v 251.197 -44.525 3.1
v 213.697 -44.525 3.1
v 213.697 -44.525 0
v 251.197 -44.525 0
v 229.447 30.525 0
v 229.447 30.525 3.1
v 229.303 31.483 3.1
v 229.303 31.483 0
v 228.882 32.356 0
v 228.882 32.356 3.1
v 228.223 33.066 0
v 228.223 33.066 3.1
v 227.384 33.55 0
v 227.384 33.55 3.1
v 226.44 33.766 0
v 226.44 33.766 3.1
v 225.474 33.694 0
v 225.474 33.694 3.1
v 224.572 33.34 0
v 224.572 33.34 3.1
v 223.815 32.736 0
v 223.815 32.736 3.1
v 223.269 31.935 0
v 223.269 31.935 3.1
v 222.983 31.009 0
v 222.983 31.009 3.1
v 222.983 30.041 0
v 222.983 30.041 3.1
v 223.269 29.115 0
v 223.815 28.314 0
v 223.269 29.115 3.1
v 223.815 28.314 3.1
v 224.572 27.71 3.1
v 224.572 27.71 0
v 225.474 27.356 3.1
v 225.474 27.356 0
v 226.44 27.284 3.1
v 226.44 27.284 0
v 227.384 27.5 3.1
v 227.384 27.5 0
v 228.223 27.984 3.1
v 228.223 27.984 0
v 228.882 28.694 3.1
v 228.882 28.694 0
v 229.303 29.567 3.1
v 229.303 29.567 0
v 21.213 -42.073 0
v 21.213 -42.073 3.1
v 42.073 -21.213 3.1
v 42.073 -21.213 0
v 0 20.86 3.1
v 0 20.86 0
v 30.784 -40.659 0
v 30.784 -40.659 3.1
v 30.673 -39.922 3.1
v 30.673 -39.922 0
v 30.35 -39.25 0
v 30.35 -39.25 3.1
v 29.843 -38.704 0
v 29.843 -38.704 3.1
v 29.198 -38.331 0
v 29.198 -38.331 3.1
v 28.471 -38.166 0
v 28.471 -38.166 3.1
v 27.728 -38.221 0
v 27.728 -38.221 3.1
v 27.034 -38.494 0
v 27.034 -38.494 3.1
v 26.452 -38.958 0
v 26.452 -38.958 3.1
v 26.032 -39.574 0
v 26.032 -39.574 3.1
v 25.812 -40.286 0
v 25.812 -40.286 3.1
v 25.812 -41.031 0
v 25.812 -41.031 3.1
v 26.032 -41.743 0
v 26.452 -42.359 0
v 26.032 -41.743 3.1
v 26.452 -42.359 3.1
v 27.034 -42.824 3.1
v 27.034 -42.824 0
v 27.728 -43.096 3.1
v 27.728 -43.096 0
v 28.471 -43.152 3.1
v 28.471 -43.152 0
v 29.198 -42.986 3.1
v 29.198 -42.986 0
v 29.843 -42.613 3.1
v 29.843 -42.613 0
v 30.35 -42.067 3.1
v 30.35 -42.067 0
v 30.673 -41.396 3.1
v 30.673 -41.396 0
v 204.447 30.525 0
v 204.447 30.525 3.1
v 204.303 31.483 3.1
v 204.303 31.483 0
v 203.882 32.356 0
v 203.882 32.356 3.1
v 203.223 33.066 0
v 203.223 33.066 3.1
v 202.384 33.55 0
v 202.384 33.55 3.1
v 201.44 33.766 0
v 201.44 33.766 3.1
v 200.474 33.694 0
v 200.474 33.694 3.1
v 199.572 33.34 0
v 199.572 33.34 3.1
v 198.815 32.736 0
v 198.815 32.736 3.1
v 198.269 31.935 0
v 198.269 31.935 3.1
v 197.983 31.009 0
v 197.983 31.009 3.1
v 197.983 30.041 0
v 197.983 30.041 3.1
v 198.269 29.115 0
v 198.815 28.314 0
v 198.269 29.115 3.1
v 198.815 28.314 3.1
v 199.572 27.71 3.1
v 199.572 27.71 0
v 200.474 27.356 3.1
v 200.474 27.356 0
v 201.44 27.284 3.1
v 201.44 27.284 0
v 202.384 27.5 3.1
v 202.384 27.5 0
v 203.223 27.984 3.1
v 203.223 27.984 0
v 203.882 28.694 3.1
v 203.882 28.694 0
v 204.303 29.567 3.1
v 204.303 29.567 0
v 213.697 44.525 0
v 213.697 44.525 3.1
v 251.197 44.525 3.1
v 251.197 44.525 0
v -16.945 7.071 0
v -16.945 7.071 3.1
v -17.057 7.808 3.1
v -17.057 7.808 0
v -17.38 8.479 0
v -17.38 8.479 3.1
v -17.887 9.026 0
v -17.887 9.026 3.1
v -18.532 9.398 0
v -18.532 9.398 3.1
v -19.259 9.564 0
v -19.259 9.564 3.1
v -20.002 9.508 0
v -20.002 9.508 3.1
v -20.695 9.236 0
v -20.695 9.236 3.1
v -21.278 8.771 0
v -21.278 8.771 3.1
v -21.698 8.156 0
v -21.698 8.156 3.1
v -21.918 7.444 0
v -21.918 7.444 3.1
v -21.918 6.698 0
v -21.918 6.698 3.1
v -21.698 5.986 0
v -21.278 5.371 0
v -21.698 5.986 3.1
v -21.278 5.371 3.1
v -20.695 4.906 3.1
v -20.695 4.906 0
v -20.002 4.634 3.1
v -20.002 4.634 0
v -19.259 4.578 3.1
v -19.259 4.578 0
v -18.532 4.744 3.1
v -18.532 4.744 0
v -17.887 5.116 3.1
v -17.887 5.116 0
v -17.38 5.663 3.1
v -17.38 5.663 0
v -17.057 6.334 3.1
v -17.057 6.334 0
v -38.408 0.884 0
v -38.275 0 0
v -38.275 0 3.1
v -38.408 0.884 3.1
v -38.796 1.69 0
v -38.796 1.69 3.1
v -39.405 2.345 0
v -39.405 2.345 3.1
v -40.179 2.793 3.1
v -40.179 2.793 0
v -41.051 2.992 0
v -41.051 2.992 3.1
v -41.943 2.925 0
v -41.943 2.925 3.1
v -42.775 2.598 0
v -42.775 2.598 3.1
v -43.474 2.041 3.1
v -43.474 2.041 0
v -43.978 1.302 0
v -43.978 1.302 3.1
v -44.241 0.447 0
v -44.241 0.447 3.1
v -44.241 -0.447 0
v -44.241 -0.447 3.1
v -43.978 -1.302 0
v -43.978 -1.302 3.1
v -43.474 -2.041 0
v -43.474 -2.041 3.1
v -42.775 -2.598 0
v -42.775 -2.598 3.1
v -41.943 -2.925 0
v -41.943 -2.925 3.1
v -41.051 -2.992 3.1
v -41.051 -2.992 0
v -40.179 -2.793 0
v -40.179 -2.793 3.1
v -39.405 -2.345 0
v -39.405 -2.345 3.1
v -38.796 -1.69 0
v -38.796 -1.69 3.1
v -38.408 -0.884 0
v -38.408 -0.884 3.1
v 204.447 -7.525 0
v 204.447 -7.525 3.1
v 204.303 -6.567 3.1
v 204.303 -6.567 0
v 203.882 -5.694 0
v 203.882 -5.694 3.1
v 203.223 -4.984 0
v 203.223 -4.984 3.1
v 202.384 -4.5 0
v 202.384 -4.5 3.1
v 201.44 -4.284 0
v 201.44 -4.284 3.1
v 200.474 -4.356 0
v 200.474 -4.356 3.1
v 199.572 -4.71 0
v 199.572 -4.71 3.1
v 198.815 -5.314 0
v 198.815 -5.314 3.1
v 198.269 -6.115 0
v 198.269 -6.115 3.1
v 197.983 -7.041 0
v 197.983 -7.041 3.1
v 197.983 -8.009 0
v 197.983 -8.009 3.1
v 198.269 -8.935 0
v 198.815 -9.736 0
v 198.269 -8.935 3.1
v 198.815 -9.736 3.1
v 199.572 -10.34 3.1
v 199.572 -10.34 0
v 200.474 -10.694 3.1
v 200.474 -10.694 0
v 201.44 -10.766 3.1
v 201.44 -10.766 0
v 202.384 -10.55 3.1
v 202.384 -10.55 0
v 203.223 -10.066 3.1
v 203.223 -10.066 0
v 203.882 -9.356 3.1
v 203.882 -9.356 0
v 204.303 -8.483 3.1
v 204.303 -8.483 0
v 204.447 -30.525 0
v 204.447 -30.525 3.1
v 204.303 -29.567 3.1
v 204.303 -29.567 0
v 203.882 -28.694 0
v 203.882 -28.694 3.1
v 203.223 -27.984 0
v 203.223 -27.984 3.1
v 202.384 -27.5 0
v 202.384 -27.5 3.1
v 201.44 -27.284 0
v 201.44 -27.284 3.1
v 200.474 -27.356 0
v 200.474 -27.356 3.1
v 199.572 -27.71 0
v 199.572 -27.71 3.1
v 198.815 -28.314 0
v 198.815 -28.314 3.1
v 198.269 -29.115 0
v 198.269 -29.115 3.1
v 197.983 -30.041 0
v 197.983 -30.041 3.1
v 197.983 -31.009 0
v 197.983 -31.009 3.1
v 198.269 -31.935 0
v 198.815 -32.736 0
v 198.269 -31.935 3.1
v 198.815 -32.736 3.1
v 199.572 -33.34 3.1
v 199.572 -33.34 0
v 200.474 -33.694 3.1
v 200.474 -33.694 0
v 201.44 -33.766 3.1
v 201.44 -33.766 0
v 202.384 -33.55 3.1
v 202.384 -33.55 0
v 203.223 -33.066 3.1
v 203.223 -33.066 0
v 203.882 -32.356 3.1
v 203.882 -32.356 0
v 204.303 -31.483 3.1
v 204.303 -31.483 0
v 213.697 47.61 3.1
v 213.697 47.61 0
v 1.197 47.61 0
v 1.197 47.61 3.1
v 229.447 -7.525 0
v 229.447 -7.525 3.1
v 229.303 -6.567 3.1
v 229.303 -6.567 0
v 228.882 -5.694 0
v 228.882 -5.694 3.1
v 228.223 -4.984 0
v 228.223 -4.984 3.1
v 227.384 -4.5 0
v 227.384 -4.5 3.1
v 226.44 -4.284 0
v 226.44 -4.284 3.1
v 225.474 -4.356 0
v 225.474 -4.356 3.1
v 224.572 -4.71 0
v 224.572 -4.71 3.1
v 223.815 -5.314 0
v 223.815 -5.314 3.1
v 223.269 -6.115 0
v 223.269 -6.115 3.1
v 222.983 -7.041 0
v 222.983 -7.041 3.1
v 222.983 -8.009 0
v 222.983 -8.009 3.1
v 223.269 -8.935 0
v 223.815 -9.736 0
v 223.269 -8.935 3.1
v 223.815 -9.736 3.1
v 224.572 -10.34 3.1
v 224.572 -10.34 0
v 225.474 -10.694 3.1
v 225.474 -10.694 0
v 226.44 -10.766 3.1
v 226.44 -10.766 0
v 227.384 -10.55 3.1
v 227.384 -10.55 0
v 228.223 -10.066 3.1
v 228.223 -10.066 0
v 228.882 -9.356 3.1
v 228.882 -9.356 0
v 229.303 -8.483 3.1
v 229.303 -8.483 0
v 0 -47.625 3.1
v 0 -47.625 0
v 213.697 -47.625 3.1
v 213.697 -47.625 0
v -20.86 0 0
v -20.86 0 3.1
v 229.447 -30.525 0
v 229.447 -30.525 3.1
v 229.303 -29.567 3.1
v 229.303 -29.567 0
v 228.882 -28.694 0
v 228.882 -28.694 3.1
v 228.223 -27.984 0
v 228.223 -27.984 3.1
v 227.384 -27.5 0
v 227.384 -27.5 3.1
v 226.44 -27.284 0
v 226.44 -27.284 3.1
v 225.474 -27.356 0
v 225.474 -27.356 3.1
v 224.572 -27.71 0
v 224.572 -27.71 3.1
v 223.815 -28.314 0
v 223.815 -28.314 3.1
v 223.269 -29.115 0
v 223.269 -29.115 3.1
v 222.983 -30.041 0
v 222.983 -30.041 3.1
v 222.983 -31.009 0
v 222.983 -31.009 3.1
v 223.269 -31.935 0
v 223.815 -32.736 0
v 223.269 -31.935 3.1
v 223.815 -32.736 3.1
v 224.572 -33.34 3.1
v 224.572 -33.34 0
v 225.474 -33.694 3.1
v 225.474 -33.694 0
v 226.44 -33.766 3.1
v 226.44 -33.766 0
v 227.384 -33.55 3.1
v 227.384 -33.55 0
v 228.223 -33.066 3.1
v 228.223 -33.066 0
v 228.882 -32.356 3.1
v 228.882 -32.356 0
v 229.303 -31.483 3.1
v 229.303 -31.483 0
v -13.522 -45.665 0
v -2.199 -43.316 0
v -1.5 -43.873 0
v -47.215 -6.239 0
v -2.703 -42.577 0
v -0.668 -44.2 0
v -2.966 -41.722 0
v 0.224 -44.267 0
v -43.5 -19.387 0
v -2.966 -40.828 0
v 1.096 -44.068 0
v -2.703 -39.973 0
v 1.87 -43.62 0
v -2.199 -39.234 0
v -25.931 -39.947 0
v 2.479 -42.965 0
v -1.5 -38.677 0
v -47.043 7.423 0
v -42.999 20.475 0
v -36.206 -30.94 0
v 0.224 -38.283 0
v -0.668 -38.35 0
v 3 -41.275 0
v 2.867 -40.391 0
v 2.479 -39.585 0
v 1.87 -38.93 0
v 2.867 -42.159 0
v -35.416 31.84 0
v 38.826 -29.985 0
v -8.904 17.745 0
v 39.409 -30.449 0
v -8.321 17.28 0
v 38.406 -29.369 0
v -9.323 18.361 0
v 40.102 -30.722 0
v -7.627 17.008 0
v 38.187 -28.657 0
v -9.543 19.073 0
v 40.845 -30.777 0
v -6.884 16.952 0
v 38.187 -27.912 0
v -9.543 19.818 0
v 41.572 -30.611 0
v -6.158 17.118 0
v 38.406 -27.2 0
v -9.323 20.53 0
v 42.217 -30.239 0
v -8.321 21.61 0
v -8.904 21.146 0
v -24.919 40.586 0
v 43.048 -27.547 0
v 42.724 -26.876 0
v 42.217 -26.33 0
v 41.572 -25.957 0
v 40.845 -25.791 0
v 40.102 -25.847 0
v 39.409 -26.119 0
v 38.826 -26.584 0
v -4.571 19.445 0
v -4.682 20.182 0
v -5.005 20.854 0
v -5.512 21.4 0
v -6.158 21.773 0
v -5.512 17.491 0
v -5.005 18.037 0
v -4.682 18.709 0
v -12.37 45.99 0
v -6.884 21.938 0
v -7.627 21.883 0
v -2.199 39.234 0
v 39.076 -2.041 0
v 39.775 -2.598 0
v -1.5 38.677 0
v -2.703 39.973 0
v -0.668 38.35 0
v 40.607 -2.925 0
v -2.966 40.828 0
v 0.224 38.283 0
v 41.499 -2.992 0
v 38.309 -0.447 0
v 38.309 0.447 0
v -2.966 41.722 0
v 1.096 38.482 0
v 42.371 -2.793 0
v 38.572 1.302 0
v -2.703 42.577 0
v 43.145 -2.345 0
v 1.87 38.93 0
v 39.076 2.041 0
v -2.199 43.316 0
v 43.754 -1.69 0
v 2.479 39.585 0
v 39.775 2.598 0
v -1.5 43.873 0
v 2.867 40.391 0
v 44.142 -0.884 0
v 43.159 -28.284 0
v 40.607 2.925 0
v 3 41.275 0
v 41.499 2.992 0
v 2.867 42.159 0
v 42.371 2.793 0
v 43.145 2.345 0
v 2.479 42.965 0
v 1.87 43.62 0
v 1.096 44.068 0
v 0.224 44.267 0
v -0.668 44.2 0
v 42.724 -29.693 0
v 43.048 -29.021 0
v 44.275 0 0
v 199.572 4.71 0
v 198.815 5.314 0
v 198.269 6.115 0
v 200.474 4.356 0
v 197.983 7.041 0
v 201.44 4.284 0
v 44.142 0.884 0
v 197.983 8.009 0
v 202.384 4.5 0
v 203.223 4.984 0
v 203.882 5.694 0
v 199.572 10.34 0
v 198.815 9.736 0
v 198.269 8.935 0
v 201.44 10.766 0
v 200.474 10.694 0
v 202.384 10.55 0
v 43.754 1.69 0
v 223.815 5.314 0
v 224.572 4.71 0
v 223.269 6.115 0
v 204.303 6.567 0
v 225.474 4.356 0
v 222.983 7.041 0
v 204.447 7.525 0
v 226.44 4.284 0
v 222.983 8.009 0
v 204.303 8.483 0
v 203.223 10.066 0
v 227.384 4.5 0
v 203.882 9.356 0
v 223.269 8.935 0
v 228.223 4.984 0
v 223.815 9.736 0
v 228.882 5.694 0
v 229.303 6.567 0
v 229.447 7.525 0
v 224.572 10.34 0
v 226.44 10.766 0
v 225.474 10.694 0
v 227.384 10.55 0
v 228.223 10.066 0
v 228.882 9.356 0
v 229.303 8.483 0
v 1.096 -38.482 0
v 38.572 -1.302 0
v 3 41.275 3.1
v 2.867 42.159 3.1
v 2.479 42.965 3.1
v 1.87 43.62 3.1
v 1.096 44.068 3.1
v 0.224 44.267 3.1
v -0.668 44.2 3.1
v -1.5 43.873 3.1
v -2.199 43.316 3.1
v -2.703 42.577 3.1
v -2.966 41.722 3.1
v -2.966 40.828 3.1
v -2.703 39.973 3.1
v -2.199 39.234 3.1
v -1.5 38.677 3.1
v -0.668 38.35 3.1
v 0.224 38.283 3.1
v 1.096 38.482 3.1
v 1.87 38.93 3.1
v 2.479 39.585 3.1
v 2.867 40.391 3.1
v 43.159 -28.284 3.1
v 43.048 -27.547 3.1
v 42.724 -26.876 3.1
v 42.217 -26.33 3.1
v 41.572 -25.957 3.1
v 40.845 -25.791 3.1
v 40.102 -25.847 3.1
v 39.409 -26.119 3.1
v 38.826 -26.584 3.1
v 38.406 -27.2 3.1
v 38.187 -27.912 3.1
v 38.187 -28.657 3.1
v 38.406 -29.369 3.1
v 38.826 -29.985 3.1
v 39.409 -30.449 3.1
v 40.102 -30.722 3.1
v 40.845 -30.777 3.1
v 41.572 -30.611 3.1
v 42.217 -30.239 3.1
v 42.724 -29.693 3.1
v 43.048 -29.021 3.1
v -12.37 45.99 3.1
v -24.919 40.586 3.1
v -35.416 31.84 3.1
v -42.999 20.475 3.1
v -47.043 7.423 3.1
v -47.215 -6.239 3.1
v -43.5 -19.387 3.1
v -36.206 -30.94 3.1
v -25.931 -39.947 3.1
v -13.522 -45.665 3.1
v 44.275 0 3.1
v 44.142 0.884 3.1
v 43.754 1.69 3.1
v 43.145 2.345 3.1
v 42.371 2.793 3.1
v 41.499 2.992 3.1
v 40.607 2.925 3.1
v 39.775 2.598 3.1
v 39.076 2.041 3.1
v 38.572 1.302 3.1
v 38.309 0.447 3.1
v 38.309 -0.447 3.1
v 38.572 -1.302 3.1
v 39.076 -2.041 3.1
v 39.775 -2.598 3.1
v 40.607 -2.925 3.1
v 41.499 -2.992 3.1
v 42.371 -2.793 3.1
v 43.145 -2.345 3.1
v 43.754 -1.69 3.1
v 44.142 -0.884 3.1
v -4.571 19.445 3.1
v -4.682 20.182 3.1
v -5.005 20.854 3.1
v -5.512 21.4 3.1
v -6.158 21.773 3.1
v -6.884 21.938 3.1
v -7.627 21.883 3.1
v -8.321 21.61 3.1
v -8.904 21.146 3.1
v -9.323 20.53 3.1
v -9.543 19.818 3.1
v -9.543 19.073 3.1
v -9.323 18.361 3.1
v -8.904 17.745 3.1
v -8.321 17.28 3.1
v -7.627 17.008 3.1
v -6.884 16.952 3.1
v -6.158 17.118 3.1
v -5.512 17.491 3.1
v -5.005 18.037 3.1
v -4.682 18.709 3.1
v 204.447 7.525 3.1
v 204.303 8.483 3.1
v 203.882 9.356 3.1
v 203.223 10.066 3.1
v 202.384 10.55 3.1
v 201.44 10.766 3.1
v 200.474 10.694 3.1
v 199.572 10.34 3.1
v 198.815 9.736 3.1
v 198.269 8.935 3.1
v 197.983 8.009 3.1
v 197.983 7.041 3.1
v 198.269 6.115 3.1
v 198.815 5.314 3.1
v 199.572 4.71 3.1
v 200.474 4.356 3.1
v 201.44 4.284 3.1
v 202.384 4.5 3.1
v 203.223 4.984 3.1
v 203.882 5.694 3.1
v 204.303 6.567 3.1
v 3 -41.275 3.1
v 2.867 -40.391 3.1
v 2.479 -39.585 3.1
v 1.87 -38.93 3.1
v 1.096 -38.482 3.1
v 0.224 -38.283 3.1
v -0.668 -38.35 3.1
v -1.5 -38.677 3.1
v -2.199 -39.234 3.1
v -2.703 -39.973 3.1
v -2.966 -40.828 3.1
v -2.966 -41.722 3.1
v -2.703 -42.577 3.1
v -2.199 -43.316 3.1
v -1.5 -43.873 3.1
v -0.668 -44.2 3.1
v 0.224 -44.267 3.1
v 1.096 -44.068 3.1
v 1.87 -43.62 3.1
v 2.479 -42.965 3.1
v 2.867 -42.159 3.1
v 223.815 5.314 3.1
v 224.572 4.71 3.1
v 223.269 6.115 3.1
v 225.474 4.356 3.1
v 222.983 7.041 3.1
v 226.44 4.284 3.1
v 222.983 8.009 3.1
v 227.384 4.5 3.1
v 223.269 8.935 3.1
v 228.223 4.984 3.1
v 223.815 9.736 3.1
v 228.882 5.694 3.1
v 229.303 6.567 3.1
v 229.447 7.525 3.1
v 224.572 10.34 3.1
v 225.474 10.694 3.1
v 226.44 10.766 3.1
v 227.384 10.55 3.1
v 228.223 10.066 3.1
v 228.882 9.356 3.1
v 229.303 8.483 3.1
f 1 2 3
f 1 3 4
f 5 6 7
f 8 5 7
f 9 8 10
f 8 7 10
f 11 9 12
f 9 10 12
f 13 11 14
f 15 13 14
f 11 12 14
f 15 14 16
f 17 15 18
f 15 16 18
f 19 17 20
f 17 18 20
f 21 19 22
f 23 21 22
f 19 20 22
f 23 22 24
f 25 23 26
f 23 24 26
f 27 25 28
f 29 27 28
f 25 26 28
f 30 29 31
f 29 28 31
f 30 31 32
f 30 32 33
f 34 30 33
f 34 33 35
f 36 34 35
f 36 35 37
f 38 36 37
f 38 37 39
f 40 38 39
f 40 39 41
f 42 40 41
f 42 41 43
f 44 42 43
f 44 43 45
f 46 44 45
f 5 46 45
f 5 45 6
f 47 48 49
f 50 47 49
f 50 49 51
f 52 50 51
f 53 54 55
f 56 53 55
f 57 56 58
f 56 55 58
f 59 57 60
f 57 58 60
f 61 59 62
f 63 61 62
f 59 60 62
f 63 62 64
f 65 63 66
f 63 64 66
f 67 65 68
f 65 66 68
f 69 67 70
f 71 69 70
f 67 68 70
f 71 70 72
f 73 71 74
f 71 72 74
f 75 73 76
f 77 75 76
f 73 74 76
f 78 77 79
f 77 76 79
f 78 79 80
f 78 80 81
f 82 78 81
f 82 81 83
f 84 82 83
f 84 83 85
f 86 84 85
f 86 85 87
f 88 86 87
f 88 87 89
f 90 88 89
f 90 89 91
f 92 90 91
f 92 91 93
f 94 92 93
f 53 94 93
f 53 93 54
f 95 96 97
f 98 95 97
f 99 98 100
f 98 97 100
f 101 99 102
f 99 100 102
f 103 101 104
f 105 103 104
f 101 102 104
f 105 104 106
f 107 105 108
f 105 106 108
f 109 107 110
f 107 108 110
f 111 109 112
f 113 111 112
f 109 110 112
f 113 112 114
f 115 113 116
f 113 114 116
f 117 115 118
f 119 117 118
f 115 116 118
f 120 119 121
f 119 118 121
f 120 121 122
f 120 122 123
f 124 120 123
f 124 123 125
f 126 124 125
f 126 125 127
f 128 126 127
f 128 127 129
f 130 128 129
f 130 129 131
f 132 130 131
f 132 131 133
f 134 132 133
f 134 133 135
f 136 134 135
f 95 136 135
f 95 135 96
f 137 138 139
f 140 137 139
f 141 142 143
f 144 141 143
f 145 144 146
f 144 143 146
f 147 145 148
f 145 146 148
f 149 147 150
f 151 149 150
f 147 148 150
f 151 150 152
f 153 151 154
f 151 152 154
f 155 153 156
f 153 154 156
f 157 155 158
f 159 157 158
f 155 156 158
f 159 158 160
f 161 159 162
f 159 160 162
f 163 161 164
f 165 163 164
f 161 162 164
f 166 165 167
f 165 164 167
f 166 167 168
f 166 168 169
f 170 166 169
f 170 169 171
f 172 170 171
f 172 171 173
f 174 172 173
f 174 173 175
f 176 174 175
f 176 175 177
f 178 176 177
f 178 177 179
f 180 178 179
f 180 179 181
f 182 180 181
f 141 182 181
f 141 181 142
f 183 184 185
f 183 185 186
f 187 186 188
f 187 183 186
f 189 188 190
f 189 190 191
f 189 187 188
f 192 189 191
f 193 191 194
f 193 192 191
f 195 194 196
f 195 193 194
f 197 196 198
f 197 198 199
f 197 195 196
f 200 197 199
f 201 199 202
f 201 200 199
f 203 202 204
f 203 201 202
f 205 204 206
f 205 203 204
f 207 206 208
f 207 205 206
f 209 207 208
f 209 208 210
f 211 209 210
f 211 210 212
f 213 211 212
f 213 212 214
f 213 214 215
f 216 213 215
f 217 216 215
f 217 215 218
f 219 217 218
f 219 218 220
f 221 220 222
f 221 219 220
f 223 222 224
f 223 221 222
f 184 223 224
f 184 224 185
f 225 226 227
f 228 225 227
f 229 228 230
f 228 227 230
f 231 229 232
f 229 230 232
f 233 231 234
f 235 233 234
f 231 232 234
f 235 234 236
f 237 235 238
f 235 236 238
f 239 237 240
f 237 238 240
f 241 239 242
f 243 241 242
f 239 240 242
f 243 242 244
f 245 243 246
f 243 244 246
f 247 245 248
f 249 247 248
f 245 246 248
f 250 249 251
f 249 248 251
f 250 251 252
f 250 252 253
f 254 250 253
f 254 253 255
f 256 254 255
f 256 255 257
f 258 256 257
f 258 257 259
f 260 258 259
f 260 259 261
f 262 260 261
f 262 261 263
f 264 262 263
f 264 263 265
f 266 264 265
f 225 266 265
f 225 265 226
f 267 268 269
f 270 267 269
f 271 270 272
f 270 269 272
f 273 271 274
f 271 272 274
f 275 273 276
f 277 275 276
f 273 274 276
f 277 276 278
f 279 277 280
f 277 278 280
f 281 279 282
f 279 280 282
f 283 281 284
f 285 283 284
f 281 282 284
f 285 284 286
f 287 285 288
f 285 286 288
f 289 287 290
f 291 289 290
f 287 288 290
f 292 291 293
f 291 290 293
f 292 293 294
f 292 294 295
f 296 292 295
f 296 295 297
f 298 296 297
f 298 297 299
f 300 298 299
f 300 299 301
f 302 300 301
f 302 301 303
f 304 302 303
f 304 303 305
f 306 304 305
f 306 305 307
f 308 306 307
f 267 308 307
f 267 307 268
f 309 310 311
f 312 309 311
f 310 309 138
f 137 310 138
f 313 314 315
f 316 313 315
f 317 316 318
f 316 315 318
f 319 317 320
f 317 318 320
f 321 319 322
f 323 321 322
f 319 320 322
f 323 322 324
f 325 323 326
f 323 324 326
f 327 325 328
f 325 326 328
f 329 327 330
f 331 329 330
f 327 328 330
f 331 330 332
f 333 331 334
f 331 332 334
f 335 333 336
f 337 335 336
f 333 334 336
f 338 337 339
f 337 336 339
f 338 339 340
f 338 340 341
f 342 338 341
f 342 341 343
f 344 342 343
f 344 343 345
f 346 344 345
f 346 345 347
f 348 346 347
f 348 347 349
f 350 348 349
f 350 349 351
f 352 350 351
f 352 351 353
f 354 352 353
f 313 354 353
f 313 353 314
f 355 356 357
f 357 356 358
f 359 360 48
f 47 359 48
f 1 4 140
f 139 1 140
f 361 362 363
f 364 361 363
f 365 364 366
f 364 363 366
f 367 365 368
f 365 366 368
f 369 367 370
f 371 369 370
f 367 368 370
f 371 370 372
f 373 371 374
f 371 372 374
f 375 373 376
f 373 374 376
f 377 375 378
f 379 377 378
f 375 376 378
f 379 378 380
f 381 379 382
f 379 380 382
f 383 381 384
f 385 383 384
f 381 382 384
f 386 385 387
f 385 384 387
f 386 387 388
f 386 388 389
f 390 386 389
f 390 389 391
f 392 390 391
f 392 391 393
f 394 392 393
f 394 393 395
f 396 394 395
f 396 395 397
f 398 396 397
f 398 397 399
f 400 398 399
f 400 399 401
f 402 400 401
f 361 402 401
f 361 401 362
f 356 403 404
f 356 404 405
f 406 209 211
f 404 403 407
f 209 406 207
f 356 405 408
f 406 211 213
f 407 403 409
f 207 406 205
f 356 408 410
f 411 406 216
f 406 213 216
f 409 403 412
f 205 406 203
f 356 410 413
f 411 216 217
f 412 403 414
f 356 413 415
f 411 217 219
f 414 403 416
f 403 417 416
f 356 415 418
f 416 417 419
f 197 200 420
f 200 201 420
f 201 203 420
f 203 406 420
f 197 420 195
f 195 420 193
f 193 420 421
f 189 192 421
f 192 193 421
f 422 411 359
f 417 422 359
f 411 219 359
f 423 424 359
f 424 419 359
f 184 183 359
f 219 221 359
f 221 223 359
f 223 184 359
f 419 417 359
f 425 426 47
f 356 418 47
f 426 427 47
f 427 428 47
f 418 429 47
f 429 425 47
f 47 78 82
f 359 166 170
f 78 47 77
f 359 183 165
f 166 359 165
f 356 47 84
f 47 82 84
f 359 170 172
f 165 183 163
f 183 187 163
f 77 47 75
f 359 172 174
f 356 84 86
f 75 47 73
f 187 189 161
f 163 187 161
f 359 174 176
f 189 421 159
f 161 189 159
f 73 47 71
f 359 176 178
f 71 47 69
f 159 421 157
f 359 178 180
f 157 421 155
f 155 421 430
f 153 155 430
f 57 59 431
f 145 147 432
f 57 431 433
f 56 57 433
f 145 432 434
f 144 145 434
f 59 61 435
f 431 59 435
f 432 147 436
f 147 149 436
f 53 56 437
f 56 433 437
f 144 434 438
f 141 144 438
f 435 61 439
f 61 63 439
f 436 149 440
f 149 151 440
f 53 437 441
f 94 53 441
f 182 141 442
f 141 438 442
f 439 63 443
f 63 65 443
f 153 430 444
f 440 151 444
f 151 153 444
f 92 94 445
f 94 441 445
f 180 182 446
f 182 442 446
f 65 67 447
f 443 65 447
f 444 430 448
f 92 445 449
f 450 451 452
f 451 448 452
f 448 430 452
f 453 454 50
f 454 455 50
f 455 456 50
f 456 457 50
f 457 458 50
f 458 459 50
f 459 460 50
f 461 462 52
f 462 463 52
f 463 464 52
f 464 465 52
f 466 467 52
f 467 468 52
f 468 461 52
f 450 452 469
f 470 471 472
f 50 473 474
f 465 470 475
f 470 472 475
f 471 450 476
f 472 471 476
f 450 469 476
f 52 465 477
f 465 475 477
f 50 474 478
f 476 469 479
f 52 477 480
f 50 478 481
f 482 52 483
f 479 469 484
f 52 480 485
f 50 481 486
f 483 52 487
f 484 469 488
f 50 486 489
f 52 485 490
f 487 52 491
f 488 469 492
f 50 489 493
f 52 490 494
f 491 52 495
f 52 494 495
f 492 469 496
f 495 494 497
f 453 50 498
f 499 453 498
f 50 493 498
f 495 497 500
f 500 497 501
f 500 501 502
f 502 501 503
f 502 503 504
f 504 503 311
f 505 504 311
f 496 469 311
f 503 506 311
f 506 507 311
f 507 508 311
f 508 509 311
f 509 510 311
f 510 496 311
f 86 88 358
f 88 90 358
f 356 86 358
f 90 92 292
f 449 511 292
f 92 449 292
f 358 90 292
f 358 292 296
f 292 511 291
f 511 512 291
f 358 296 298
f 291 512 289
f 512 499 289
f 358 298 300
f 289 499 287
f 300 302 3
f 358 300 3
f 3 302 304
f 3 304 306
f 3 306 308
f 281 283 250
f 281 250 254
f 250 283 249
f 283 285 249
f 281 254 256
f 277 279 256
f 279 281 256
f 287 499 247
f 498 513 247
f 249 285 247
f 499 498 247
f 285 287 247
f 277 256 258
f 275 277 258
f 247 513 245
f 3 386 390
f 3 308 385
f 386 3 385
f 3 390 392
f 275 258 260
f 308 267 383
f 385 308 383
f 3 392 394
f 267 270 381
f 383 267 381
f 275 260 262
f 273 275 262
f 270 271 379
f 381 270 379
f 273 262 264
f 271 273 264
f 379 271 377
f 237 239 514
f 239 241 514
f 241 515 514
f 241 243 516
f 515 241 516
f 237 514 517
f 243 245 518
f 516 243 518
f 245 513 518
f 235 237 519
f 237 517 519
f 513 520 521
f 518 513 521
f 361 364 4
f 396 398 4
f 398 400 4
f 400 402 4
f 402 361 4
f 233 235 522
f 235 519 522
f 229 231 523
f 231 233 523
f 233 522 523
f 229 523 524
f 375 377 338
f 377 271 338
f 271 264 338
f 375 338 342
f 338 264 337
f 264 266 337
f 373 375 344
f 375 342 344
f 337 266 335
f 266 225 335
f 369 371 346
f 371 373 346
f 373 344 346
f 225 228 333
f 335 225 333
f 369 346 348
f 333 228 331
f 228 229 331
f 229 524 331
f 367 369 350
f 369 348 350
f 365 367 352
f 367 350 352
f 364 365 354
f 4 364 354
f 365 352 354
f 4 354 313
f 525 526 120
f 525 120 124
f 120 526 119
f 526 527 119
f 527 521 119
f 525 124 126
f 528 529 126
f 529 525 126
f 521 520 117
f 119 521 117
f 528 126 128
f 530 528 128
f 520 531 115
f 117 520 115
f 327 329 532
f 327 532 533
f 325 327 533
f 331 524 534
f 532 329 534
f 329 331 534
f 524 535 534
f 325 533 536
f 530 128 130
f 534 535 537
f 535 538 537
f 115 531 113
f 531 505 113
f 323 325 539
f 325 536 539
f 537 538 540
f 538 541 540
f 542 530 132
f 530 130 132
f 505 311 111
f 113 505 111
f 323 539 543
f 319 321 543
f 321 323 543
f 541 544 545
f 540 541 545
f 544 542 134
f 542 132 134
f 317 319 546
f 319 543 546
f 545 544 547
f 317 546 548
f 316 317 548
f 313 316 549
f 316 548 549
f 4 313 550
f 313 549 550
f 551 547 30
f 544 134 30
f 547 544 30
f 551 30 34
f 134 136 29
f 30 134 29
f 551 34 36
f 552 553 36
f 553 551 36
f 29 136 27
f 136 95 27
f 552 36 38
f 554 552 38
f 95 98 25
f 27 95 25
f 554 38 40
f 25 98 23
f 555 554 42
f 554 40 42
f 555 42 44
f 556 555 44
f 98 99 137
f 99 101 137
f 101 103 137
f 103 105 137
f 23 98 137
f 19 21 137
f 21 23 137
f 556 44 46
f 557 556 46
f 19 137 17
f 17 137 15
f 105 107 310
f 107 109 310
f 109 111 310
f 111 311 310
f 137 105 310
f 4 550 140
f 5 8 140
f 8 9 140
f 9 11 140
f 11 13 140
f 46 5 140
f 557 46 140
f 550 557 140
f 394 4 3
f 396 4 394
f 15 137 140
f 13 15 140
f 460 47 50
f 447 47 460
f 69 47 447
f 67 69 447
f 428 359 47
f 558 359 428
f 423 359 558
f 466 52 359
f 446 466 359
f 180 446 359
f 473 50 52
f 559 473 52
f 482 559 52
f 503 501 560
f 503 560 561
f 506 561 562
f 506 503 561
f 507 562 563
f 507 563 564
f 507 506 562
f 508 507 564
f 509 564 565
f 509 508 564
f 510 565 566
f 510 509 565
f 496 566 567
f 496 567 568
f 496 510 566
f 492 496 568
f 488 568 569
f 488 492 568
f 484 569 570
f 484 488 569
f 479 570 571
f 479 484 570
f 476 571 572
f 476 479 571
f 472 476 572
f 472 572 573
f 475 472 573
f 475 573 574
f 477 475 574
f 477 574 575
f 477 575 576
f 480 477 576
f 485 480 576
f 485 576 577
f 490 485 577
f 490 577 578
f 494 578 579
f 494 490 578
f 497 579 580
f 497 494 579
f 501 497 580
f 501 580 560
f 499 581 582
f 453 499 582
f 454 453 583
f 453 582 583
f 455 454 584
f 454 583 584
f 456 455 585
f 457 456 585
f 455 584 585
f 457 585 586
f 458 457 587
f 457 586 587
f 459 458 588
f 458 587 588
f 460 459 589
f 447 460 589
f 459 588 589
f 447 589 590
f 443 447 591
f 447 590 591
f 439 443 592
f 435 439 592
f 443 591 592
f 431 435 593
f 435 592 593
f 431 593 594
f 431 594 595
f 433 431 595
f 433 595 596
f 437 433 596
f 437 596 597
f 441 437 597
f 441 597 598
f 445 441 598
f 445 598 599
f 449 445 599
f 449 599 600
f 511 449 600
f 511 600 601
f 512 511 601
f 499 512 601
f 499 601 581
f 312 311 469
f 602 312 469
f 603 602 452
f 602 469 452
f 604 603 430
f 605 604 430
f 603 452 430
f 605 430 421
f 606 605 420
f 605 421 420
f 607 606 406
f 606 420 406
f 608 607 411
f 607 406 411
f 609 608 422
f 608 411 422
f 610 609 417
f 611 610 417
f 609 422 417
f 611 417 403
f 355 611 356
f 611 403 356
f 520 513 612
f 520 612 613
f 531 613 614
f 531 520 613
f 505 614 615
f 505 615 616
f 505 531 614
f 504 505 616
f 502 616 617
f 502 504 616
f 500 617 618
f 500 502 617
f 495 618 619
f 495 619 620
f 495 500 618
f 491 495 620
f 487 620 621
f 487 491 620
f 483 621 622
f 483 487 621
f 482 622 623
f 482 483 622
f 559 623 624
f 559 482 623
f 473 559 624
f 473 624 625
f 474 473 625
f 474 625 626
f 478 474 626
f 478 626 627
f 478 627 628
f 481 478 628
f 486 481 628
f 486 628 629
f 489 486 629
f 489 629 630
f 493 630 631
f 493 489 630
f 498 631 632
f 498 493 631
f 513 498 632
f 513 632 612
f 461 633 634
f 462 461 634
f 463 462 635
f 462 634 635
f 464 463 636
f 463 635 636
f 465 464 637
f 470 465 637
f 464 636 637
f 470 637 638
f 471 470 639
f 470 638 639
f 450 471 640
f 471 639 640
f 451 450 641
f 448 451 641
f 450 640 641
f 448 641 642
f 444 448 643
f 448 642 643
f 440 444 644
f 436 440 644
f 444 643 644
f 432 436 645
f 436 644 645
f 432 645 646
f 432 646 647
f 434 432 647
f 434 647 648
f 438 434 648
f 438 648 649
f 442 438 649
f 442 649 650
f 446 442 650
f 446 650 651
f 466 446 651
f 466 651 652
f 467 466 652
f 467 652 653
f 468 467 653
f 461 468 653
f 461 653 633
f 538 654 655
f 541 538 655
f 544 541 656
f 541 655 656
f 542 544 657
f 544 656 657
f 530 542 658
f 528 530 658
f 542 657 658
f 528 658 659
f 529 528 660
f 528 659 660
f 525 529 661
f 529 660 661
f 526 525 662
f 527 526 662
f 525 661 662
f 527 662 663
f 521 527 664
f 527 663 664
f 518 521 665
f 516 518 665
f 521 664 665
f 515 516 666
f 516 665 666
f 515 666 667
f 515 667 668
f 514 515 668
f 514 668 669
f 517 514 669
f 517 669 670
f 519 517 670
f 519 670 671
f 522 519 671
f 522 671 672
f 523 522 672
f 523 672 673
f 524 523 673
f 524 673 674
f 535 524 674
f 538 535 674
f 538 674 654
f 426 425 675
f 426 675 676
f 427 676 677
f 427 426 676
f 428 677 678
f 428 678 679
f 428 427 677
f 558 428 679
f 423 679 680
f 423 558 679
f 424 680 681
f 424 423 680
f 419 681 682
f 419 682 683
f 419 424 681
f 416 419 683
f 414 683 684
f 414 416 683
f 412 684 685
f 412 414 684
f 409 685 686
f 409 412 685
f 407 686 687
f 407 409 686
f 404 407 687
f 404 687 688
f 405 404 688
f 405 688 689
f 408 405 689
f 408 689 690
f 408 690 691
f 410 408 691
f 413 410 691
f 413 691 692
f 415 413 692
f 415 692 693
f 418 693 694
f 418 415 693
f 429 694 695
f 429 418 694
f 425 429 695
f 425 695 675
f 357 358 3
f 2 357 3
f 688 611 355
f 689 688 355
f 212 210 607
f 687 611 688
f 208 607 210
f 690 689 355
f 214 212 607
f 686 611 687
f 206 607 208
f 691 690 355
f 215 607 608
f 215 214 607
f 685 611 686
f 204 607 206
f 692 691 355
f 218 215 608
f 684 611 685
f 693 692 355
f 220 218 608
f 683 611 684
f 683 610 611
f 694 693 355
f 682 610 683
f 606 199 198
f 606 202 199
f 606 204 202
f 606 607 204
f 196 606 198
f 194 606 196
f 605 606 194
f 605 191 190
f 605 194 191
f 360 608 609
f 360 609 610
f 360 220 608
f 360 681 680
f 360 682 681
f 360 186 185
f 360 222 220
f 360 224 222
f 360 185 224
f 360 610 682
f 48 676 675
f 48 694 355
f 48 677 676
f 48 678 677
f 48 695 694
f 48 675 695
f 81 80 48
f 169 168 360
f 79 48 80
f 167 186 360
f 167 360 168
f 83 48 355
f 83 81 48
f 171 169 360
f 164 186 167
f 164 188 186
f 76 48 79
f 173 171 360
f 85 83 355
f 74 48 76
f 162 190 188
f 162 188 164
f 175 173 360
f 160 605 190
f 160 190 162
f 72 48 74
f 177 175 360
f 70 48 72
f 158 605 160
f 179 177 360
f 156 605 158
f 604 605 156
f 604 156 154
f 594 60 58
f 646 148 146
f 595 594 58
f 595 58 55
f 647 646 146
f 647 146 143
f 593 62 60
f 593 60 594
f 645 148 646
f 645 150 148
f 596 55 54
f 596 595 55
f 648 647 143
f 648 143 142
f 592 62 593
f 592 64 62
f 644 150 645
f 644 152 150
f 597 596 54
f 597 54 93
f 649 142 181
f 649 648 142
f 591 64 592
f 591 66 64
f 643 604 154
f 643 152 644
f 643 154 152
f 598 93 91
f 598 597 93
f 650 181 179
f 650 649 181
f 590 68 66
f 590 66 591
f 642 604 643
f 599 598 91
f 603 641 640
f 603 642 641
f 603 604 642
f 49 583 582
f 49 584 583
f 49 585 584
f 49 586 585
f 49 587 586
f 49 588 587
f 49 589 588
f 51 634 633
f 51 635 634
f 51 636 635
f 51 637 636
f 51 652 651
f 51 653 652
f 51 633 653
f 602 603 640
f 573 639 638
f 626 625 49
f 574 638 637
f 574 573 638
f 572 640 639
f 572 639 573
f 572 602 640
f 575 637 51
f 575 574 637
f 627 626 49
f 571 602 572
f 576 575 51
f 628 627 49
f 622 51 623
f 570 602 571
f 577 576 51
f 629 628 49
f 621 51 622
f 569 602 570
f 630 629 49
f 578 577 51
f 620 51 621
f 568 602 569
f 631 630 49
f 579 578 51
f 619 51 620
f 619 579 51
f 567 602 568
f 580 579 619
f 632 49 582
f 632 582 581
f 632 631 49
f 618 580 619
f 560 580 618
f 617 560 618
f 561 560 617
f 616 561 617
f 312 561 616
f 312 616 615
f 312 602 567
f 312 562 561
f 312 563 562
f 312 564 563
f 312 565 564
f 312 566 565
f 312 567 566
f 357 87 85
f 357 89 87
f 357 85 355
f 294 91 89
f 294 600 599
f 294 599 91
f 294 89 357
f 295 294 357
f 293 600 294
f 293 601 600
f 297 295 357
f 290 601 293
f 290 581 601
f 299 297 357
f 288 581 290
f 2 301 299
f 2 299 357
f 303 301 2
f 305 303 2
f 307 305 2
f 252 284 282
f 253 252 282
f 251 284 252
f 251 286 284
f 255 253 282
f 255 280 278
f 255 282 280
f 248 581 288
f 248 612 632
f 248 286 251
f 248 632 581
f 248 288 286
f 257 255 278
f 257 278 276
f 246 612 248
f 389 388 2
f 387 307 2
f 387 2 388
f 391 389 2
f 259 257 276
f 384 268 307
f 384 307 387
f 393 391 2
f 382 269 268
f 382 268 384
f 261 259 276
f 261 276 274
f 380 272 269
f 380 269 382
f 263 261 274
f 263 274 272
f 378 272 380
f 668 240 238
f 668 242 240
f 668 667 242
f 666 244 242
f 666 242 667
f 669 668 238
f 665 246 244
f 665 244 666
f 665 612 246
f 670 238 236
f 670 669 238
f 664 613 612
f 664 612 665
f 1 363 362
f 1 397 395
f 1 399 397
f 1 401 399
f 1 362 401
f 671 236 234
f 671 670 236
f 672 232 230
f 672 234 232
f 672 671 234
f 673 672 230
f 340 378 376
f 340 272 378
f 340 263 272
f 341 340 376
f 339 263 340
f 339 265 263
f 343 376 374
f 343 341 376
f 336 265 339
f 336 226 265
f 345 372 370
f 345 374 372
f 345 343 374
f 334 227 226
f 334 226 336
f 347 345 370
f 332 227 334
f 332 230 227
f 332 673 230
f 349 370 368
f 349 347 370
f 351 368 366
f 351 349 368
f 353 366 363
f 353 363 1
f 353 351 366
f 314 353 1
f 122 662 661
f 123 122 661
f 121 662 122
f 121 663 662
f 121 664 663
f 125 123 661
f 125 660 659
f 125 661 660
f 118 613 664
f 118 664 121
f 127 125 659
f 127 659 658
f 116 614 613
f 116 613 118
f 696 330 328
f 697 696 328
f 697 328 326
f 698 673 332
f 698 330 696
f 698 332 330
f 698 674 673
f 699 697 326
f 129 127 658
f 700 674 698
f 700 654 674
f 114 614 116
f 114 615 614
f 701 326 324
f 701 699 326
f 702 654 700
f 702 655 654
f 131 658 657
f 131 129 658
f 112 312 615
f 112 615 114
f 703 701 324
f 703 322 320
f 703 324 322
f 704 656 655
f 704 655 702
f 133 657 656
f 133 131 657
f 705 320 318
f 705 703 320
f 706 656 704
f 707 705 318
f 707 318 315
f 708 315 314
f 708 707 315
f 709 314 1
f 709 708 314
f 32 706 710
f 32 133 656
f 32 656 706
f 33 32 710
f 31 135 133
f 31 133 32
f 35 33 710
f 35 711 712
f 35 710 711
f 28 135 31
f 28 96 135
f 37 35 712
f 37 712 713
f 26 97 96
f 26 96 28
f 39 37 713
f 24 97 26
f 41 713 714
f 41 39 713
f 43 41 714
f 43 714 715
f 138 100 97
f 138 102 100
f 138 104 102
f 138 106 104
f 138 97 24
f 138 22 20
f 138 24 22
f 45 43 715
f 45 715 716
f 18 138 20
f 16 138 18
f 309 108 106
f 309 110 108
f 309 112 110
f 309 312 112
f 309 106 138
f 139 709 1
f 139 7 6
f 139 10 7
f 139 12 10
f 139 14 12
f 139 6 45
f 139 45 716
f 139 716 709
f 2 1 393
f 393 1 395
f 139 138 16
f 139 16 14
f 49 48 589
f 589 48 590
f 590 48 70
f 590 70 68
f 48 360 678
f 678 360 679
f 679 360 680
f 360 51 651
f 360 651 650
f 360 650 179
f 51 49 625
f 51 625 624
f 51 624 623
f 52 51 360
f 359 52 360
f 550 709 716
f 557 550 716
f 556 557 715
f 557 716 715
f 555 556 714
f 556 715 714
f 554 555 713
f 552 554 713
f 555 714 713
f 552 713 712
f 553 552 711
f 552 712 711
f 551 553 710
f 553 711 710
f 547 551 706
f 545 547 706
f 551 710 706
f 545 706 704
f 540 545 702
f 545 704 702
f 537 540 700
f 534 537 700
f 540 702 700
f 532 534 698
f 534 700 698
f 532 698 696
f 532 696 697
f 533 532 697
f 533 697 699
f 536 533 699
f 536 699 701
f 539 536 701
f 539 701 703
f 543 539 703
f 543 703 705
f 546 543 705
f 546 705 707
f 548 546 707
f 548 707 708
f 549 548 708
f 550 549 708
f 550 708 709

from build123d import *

# Parameters (mm, degrees)
SKETCH1_R           = 3
BOSS_EXTRUDE1_DEPTH = 3.1
SKETCH2_R           = 2.5
CUT_EXTRUDE1_DEPTH  = 4.1
SKETCH3_W           = 37.5
SKETCH3_H           = 3.1
CUT_EXTRUDE2_DEPTH  = 4.1
SKETCH7_R           = 3.25
CUT_EXTRUDE5_DEPTH  = 4.1


with BuildPart() as part:
    # Sketch1 → Boss-Extrude1 (new body)
    with BuildSketch(Plane.XY):
        with BuildLine():
            Line((0, -47.625), (251.196924141, -47.625))
            Line((251.196924141, -47.625), (251.196924141, 47.609956917))
            Line((251.196924141, 47.609956917), (1.196924141, 47.609956917))
            ThreePointArc((1.196924141, 47.609956917), (-47.621239081, 0.598509335), (0, -47.625))
        make_face()
        with Locations((0, -41.275)):
            Circle(SKETCH1_R, mode=Mode.SUBTRACT)
        with Locations((-41.275, 0)):
            Circle(SKETCH1_R, mode=Mode.SUBTRACT)
        with Locations((0, 41.275)):
            Circle(SKETCH1_R, mode=Mode.SUBTRACT)
        with Locations((41.275, 0)):
            Circle(SKETCH1_R, mode=Mode.SUBTRACT)
    extrude(amount=BOSS_EXTRUDE1_DEPTH)

    # Sketch2 → Cut-Extrude1 (cut, through all)
    with BuildSketch(Plane.XY.offset(3.1)):
        with Locations((-19.445436483, 7.071067812)):
            Circle(SKETCH2_R)
        with Locations((-7.071067812, 19.445436483)):
            Circle(SKETCH2_R)
        with Locations((40.658639918, -28.284271247)):
            Circle(SKETCH2_R)
        with Locations((28.284271247, -40.658639918)):
            Circle(SKETCH2_R)
        Polygon((21.213203436, -42.072853481), (42.072853481, -21.213203436), (0, 20.859650045), (-20.859650045, 0), align=None)
    extrude(amount=-CUT_EXTRUDE1_DEPTH, mode=Mode.SUBTRACT)

    # Sketch3 → Cut-Extrude2 (cut, through all)
    with BuildSketch(Plane.XY.offset(3.1)):
        with Locations((232.446924141, -46.075)):
            Rectangle(SKETCH3_W, SKETCH3_H)
    cut_extrude2 = extrude(amount=-CUT_EXTRUDE2_DEPTH, mode=Mode.SUBTRACT)

    # Mirror1: Cut-Extrude2 across plane
    add(cut_extrude2.mirror(Plane.ZX), mode=Mode.SUBTRACT)

    # Sketch7 → Cut-Extrude5 (cut, through all)
    with BuildSketch(Plane.XY.offset(3.1)):
        with Locations((226.196924141, -30.525)):
            Circle(SKETCH7_R)
        with Locations((226.196924141, -7.525)):
            Circle(SKETCH7_R)
        with Locations((226.196924141, 7.525)):
            Circle(SKETCH7_R)
        with Locations((226.196924141, 30.525)):
            Circle(SKETCH7_R)
        with Locations((201.196924141, -30.525)):
            Circle(SKETCH7_R)
        with Locations((201.196924141, -7.525)):
            Circle(SKETCH7_R)
        with Locations((201.196924141, 7.525)):
            Circle(SKETCH7_R)
        with Locations((201.196924141, 30.525)):
            Circle(SKETCH7_R)
    extrude(amount=-CUT_EXTRUDE5_DEPTH, mode=Mode.SUBTRACT)


solid = part.part
